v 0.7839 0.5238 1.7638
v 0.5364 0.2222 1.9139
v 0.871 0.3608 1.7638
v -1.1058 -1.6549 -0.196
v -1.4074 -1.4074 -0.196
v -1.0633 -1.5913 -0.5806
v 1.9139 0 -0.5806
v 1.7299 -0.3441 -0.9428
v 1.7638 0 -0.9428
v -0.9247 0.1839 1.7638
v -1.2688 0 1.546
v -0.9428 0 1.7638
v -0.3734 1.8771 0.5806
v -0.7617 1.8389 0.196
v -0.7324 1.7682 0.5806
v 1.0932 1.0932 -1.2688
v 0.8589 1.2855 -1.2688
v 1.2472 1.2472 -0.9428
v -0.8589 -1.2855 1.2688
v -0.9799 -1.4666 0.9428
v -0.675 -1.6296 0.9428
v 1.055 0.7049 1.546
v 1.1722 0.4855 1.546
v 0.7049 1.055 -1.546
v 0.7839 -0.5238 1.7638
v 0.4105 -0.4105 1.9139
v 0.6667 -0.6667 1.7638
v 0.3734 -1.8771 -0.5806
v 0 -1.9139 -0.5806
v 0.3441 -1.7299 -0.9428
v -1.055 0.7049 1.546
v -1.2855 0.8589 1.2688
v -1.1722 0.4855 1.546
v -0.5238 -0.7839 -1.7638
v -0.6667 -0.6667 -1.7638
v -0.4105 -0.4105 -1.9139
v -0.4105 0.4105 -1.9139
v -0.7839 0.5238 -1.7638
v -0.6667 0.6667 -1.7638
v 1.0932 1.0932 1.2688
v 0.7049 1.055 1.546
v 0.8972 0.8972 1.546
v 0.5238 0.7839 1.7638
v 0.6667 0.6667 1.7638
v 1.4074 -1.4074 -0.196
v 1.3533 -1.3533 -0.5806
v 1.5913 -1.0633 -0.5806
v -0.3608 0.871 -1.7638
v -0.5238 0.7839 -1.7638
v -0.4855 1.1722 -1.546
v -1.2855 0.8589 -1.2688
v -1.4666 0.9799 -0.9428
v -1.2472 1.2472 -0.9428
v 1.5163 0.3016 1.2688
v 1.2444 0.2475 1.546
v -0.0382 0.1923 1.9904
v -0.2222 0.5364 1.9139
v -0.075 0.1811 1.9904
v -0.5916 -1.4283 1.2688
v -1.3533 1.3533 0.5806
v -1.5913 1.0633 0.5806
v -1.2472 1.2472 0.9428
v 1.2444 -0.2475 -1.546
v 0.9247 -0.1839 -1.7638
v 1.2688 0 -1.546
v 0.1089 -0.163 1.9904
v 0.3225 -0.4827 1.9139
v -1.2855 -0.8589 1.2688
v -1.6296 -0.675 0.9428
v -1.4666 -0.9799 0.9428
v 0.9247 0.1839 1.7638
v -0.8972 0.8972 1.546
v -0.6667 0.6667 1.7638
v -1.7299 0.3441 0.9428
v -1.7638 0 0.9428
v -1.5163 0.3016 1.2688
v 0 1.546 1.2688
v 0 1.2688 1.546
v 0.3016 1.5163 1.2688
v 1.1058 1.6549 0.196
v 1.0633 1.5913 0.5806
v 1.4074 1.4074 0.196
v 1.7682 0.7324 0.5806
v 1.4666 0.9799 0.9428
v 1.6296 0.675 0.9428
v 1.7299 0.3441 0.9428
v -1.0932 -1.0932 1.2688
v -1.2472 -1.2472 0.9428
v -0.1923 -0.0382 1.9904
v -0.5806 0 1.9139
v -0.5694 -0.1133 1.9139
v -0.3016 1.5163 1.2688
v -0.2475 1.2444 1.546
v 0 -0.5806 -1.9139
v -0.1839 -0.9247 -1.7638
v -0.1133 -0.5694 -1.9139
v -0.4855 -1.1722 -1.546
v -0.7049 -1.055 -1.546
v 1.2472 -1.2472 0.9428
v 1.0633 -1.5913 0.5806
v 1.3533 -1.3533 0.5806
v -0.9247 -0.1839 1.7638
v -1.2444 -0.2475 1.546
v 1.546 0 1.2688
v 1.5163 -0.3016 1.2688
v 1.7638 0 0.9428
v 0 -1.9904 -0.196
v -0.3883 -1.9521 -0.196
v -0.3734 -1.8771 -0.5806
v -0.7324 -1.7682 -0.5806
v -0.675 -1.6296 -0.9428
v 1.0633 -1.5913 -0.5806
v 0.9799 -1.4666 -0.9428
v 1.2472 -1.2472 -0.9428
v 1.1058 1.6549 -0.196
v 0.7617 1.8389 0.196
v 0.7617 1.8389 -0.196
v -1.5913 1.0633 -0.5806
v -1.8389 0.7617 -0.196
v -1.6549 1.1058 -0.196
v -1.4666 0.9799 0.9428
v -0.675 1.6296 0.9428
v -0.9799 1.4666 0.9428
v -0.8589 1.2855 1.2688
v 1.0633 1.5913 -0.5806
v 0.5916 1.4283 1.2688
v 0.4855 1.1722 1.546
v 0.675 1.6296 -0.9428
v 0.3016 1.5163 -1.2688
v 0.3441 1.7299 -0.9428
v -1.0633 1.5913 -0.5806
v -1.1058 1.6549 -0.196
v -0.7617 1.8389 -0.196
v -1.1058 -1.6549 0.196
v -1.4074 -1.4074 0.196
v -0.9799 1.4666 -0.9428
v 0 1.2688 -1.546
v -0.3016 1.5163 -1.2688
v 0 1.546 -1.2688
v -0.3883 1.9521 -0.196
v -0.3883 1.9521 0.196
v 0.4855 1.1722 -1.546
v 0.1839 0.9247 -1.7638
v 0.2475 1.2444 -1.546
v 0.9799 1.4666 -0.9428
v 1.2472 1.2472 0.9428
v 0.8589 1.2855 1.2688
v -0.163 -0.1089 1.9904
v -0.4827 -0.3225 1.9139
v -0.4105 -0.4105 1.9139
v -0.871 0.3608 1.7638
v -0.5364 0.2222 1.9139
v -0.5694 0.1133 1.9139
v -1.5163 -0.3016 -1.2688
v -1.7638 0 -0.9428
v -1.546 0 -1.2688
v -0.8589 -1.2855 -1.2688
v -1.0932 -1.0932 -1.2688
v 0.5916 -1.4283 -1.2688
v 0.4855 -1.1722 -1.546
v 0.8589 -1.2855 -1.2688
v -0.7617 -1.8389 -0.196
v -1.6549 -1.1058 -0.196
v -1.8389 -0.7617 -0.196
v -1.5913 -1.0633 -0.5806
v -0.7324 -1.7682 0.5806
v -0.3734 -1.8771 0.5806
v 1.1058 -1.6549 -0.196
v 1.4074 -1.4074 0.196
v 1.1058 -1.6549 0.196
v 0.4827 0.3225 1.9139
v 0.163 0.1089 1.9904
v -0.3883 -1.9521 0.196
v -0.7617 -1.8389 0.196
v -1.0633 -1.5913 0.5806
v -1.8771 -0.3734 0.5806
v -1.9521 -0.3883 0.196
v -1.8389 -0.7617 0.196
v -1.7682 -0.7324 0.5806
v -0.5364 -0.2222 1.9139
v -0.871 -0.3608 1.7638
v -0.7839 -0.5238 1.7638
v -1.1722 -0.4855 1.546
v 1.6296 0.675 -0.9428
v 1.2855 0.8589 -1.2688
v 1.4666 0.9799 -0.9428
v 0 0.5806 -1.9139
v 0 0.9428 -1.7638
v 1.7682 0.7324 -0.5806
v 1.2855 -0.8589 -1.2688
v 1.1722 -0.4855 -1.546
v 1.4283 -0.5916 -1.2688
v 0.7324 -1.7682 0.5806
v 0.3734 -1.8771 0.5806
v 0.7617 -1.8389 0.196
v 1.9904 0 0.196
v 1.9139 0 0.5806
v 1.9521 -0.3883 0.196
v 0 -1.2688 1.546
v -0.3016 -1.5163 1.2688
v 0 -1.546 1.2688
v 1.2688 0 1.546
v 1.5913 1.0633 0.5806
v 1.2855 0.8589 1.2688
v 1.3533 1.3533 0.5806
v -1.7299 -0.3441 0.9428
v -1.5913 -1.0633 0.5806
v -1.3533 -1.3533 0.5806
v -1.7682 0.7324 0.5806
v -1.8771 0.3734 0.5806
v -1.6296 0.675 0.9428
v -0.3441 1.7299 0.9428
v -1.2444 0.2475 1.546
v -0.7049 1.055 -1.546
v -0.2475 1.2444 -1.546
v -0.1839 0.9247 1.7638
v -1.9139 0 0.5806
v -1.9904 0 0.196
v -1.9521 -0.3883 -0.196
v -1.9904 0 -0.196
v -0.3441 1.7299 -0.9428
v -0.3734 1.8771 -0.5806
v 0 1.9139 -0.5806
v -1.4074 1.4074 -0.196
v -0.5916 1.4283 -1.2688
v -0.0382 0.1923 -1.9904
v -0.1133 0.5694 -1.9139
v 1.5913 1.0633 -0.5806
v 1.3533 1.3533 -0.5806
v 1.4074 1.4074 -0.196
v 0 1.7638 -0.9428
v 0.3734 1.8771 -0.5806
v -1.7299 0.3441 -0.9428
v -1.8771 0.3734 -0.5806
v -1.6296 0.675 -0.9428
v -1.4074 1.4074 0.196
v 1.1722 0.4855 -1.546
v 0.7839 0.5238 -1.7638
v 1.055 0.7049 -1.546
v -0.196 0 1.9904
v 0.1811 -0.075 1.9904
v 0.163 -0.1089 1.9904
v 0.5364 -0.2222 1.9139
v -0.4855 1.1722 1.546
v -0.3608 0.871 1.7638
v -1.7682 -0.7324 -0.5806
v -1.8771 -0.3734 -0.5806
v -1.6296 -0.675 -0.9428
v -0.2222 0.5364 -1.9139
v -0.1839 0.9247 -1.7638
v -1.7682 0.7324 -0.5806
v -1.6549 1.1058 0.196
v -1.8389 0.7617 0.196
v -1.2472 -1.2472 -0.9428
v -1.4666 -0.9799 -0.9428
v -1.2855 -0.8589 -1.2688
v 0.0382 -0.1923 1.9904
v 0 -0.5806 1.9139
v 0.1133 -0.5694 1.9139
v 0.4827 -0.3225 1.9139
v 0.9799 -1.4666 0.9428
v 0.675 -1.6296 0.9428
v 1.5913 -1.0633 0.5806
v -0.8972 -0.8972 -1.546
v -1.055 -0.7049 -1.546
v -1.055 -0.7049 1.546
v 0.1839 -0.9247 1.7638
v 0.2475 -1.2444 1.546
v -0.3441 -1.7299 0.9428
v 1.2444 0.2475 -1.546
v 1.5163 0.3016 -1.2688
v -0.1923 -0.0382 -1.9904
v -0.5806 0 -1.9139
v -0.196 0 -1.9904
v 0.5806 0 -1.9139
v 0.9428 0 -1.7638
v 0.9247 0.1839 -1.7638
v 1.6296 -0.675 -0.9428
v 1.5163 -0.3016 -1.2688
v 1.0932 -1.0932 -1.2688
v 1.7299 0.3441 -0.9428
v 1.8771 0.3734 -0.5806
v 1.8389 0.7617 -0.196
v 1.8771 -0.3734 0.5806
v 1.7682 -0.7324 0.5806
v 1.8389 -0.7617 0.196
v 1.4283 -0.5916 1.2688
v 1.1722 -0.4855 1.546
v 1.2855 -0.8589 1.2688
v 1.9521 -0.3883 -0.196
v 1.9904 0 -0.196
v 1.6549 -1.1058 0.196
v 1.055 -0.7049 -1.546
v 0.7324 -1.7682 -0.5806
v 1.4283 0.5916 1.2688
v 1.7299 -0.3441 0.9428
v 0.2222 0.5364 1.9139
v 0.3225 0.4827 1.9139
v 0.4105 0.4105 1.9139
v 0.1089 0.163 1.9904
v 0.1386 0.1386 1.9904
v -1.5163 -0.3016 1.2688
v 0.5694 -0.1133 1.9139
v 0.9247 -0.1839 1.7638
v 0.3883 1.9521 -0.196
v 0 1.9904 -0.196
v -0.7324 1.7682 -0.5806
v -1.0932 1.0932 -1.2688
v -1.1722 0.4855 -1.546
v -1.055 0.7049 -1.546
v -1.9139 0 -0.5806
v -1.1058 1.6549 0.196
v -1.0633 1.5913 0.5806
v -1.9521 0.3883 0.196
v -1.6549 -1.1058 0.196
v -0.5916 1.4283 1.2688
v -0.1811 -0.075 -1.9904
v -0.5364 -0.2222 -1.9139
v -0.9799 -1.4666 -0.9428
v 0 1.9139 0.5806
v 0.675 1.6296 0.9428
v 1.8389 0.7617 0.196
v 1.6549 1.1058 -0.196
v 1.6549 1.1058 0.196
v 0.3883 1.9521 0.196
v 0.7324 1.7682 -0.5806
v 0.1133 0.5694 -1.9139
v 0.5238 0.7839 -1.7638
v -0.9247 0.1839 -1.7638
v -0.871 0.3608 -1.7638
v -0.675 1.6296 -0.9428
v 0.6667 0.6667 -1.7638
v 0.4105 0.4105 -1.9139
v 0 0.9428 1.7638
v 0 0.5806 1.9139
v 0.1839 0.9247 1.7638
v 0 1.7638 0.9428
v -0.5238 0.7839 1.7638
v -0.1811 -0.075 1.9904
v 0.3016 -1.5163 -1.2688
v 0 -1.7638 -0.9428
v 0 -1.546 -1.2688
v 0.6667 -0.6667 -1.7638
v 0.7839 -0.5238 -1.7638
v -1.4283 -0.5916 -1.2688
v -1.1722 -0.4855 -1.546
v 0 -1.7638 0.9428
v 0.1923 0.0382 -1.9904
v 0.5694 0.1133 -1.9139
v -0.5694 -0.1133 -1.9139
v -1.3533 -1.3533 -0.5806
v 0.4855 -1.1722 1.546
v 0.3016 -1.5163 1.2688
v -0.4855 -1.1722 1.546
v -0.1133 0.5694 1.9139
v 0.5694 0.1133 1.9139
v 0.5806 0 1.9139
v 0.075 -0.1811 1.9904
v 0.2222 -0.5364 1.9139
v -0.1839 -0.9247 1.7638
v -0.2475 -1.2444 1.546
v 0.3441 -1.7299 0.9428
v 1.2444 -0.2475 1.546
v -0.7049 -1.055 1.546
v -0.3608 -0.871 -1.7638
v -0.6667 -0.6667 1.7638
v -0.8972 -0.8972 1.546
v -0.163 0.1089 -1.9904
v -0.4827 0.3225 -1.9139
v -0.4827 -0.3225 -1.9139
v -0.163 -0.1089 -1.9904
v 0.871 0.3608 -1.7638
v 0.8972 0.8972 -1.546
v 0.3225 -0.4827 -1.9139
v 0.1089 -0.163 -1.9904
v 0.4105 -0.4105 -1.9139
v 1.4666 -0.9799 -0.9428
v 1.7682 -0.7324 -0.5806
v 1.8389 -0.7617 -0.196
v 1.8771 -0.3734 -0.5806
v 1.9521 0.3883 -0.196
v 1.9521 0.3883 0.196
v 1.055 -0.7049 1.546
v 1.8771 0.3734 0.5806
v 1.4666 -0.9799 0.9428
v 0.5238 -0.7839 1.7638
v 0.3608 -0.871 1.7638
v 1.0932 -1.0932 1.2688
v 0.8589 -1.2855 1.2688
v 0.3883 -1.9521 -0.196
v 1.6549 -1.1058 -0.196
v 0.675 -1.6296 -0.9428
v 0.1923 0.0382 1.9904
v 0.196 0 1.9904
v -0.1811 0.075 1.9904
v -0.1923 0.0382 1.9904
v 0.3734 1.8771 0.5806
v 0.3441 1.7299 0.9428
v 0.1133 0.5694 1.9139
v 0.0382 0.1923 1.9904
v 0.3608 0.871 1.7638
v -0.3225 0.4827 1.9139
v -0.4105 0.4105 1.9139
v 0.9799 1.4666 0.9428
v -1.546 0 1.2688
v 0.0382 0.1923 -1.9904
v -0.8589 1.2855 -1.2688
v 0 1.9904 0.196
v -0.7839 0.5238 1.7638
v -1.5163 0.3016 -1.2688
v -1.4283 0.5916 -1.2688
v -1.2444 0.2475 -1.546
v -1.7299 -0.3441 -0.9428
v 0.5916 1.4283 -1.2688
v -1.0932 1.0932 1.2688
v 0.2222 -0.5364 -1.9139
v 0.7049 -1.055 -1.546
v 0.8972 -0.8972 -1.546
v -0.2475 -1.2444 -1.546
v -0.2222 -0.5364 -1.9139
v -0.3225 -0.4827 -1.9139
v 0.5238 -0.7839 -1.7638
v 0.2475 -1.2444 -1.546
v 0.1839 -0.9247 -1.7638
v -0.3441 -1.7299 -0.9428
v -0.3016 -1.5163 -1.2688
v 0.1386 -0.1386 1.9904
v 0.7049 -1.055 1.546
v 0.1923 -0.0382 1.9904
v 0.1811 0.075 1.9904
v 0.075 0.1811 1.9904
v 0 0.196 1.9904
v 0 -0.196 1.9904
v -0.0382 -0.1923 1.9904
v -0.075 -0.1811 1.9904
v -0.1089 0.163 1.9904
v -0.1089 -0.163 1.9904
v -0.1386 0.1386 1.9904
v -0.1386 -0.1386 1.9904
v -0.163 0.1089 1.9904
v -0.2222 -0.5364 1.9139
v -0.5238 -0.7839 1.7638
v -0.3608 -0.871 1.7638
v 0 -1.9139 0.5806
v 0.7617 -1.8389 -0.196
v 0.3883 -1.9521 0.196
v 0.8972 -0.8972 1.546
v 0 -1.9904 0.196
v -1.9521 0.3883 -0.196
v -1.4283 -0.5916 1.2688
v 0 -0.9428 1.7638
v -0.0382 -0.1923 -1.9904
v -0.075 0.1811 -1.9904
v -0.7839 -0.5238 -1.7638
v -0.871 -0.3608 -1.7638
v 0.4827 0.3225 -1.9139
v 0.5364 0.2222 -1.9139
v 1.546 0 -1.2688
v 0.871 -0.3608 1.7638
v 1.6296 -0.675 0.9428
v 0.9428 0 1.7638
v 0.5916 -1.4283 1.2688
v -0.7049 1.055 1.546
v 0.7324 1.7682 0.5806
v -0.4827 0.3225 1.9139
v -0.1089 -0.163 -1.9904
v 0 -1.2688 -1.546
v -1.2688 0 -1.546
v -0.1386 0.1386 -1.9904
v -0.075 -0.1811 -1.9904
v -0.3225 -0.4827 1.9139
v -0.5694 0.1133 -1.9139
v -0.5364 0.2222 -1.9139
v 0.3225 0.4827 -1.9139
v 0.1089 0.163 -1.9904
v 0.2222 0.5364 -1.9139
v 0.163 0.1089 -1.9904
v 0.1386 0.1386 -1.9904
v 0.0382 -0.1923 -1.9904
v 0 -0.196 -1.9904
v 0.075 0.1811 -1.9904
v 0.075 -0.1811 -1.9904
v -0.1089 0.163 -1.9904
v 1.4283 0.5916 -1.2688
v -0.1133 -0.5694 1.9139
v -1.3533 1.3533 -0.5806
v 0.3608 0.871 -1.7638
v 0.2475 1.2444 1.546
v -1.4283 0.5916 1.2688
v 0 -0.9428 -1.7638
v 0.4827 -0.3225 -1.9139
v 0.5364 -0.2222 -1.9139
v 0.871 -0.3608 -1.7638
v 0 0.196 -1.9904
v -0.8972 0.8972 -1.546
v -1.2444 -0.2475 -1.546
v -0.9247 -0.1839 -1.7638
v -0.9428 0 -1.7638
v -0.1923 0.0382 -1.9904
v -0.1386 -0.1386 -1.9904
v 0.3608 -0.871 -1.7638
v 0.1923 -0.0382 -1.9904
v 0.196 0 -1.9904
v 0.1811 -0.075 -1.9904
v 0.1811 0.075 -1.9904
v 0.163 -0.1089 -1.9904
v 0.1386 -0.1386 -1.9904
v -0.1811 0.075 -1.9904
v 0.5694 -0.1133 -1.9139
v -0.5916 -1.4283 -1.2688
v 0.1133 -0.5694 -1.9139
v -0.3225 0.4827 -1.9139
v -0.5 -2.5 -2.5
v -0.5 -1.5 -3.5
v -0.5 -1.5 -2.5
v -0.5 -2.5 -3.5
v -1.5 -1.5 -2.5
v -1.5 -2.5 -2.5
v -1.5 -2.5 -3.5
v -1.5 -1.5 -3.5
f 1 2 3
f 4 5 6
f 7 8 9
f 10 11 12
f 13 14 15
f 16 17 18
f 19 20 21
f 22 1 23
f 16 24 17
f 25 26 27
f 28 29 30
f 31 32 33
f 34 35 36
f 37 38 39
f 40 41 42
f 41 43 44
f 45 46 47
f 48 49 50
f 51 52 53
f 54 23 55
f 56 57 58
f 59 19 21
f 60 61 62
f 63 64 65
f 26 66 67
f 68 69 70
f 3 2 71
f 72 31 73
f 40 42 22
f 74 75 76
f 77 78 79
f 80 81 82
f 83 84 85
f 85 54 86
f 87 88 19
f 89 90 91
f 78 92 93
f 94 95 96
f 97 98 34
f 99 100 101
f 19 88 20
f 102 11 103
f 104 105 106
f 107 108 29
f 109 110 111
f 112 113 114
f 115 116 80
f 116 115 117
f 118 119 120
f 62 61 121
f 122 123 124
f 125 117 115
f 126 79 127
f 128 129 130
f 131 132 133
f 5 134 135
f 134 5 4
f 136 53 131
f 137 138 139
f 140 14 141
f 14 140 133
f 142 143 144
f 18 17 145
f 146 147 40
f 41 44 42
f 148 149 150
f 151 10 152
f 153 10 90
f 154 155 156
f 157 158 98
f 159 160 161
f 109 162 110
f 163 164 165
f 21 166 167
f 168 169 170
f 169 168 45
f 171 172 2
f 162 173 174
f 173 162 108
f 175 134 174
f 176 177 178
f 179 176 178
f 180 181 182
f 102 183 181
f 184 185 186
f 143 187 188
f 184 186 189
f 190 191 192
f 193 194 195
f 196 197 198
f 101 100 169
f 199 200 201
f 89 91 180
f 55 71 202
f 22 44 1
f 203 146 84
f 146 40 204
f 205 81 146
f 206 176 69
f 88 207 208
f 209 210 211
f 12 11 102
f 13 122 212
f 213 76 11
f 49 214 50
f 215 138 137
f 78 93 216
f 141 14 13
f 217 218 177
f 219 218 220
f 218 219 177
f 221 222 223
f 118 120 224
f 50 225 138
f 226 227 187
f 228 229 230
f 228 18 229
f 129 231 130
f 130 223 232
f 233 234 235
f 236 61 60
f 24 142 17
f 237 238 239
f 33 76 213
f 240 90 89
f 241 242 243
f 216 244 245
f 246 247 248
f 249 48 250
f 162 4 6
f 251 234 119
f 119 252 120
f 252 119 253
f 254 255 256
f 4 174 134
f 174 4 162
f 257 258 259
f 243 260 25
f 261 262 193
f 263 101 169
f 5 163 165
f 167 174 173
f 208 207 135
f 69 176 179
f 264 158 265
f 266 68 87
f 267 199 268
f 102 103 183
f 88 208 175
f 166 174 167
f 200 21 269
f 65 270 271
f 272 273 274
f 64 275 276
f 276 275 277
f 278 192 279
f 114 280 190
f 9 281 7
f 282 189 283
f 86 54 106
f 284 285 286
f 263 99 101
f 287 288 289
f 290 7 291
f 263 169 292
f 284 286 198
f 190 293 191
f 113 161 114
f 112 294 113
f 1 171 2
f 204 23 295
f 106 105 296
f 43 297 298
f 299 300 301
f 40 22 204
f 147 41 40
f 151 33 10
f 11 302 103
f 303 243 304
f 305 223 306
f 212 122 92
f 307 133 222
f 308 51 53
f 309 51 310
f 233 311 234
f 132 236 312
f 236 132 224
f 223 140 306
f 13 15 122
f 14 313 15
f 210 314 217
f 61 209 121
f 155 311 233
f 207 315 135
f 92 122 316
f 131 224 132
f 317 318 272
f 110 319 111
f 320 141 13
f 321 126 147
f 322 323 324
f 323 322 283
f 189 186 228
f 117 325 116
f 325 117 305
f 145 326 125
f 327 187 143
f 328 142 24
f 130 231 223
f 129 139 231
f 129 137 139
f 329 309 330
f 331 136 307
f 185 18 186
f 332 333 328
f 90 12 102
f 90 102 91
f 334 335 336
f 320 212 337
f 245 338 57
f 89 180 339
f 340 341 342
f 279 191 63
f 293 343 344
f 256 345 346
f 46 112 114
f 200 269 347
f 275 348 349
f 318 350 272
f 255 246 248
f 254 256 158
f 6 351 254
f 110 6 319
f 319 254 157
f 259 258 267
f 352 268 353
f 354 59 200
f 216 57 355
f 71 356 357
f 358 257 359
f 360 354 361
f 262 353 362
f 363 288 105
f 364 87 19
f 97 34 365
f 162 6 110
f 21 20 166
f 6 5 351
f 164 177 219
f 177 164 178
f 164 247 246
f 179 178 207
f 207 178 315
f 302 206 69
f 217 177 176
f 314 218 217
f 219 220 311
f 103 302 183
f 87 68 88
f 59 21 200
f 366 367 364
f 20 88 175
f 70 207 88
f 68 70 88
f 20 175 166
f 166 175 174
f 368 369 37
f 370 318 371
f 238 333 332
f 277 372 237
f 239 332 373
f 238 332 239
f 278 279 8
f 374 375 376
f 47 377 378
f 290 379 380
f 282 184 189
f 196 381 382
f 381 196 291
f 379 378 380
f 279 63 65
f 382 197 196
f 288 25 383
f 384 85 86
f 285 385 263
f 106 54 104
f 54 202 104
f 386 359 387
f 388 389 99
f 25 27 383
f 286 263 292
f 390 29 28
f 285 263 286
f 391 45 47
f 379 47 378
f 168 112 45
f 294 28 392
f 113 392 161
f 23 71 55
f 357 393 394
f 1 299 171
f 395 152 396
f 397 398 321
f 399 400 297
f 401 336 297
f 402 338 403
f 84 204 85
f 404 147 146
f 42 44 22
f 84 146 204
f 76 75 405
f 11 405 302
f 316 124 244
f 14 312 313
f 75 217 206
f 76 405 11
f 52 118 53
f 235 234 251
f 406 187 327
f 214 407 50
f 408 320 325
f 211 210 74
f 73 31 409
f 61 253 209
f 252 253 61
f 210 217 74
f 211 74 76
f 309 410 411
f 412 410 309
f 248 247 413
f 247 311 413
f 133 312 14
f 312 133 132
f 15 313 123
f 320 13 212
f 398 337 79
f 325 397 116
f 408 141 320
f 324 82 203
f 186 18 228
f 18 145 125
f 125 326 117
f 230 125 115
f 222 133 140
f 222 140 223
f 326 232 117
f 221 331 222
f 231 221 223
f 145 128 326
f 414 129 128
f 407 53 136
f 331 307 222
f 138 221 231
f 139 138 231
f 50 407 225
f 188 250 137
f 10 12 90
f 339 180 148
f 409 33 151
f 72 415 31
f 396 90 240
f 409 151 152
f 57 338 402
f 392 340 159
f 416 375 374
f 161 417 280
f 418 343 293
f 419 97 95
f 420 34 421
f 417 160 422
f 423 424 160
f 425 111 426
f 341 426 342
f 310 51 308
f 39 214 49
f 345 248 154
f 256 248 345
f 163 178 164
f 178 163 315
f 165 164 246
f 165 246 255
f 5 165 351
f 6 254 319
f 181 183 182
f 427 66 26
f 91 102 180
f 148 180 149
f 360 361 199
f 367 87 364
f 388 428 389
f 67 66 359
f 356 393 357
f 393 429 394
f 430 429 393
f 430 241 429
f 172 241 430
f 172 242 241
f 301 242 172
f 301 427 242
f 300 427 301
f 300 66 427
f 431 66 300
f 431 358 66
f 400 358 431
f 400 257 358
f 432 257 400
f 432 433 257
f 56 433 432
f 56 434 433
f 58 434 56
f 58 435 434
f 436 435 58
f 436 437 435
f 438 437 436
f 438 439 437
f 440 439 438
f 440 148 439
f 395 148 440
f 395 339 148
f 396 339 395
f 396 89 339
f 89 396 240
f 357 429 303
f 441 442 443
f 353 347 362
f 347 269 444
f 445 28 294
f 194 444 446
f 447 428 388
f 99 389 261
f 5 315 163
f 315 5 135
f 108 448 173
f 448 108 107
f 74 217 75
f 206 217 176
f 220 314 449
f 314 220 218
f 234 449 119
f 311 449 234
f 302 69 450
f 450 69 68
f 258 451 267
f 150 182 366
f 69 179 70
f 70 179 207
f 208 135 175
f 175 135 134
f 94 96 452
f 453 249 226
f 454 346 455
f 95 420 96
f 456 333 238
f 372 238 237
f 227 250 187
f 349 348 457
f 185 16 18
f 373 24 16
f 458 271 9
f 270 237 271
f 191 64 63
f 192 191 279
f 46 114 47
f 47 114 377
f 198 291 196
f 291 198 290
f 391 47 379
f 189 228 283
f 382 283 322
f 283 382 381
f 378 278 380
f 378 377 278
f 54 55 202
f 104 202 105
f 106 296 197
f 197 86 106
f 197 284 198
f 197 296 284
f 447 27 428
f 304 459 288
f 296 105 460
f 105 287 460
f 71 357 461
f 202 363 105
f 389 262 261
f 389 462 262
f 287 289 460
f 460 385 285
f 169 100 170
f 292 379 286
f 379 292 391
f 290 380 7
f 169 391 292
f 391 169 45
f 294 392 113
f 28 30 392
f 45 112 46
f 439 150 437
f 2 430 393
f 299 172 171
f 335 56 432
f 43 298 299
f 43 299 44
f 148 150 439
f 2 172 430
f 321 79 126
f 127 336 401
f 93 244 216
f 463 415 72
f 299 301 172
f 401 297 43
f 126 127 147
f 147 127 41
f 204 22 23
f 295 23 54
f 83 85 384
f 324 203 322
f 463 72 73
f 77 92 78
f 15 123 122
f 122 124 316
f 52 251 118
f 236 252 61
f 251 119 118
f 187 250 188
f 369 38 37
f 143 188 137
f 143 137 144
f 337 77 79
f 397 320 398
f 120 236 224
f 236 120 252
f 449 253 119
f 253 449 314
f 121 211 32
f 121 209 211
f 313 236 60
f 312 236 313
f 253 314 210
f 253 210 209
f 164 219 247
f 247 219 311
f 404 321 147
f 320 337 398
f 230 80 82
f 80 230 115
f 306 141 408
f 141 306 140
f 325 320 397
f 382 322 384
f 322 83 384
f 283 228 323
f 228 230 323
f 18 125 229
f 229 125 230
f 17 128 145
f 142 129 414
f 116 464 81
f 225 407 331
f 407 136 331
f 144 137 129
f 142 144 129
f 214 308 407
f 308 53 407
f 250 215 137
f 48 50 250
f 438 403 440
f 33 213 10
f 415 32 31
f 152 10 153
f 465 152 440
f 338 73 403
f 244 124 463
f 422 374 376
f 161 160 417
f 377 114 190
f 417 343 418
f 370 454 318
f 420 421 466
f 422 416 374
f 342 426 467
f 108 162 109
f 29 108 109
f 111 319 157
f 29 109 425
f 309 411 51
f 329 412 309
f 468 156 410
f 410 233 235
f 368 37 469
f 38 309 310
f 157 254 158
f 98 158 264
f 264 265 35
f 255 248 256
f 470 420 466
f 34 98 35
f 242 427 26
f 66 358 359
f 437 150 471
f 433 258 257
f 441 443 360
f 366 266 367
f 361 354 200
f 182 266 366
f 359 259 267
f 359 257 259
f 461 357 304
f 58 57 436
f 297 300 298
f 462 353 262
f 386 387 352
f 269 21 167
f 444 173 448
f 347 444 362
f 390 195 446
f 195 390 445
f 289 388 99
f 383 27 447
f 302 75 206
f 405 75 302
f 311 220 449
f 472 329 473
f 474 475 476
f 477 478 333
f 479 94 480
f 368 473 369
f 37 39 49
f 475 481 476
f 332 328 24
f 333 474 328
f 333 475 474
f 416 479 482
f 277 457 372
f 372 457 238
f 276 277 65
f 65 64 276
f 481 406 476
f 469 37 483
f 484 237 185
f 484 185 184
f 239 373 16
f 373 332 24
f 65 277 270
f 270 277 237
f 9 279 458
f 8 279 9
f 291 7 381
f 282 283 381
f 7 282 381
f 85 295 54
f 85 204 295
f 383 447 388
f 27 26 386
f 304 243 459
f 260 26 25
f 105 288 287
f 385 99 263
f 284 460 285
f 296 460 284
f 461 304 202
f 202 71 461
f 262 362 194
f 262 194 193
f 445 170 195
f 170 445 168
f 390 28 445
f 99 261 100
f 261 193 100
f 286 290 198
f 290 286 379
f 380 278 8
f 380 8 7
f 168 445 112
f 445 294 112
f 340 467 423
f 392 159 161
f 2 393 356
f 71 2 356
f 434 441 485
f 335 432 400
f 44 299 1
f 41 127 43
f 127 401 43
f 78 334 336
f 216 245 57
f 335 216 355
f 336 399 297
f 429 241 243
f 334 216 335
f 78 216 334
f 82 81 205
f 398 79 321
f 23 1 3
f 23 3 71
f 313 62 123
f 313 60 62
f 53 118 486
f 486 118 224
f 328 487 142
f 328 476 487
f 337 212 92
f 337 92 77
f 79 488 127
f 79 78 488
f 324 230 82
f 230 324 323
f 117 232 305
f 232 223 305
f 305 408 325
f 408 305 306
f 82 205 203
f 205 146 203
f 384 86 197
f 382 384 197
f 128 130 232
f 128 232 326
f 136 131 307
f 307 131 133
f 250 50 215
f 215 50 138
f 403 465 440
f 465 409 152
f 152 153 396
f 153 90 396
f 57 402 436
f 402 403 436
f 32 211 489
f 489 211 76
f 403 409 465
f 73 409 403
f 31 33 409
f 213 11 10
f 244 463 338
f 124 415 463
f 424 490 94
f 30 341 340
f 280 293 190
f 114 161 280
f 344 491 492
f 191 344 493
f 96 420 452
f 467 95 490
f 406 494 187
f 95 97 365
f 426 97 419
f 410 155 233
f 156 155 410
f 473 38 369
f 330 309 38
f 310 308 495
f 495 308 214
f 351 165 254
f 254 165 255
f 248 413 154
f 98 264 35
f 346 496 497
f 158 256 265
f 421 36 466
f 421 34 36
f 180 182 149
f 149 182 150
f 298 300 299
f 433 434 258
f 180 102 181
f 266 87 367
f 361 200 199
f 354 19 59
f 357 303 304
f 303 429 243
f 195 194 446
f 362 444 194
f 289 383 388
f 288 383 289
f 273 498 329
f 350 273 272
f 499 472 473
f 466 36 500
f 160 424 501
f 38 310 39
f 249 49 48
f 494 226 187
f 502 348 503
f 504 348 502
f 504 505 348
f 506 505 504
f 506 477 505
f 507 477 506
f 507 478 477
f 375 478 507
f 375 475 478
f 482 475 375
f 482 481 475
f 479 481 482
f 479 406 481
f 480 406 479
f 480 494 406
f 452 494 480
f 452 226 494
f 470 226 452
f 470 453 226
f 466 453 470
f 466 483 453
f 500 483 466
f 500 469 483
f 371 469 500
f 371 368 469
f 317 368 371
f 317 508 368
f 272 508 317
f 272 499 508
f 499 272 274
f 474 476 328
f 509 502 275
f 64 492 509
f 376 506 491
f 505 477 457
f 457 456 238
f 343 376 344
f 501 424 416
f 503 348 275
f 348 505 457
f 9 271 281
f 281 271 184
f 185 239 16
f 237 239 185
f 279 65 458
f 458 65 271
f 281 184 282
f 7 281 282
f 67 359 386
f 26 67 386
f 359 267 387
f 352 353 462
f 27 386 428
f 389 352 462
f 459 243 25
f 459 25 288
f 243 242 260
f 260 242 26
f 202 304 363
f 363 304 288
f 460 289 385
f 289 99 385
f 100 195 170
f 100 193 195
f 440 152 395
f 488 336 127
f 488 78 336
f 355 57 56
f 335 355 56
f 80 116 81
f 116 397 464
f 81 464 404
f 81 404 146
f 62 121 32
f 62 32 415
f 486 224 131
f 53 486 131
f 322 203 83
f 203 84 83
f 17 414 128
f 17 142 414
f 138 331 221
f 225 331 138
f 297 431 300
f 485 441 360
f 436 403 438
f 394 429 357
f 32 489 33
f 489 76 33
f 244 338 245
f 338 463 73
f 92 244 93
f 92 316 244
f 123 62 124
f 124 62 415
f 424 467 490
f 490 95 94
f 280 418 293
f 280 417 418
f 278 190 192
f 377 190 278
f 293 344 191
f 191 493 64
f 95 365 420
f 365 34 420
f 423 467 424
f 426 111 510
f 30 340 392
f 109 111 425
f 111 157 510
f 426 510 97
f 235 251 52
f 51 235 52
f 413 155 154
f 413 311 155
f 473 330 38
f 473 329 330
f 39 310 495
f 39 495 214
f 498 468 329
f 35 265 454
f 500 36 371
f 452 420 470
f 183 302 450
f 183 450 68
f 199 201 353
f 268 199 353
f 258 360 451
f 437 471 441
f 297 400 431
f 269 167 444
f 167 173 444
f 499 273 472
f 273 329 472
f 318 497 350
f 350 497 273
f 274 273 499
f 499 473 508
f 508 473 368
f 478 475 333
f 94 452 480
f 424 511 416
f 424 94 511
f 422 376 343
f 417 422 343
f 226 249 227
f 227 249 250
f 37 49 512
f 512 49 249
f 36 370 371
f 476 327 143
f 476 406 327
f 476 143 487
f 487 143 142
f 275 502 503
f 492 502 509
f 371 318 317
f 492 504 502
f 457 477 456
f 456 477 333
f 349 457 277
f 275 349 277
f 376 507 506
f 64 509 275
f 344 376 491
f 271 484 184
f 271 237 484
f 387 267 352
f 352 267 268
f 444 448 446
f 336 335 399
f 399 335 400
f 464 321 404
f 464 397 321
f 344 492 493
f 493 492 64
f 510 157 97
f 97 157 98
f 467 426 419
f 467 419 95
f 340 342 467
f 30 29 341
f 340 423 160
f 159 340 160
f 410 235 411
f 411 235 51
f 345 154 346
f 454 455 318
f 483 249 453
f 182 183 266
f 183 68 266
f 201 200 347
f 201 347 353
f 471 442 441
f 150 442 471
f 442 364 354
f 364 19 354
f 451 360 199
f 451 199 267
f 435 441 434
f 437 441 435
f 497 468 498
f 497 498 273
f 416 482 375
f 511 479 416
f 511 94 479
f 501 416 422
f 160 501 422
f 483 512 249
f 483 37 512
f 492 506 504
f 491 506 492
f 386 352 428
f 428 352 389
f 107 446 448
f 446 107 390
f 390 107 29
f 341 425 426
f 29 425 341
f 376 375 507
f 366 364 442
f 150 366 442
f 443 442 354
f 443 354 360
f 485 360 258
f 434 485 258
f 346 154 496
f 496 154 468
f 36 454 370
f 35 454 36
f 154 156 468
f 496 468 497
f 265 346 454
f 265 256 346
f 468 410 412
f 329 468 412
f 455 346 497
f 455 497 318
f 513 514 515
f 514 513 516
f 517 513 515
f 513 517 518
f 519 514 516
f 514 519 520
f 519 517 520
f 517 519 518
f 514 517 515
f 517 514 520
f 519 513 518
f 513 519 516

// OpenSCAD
// file: ../scon.scad
function scon_value(scon,path,missing = function(path) undef,dist = 0) =
  is_undef(path) ? missing :
  (len(path) <= dist || is_undef(scon)) ?
    (is_undef(scon) ? missing(path) : scon) :
    let (
      key = path[dist],
      next = is_undef(key) ?
        scon :
	is_string(key) ?
          _scon_map(scon, key, path) :
          _scon_index(scon, key, path)
    ) scon_value(next, path, missing, dist + 1);

// Make a property-extractor function from an SCON value.
// Basic usage:
//
//   cfg_scon = [["x",1],["y",true]];
//   cfg = scon_make([["x",1],["y",true]]);
//   x=cfg(["x"]);
//   y=cfg(["y"]);
//   z=cfg(["z"], 3); // z = 3 because it is not in cfg_scon.
//
// Advanced Meta-programming note:
//   - cfg([])   ⇒ returns the full SCON data structure.
//   - cfg(undef)⇒ returns the configured missing-fallback function.
// This allows for introspection of the data used to make cfg function.
//
function scon_make(scon,base=undef)=
  is_undef(base) ?
    function(path,missing=undef)
      scon_value(scon,path,function (missing_path) missing)
  :
    function(path,missing=undef)
      scon_value(scon,path,function (missing_path) base(missing_path,missing));

//
// Convert a scon value to a json string
//
// Ex: scon_to_json(true) == "true"
//     scon_to_json(17) == "17"
//     scon_to_json("length") == "\"length\""
//     scon_to_json([["x",1],["y",2]]) == "{\"x\":1,\"y\":2}"
//     scon_to_json([2,3,5,8]) == "[2,3,5,8]"
//
//  List/object ambiguity! Since OpenSCAD has no native map, there must be an
//  ambiguity in the conversion to the distinct [item[0],item[1],...] list
//  and the {"name0":value0,"name1":value1,..} object notation in JSON.
//
//  The rule Scon uses is:
//
//    If every element of a Vector is a [string,value] pair, then it is converted
//    to an object.  Otherwise it is a list.
//
//    So [], [["x",1],["y",2]], are maps and become "{}" and "{\"x\":1,\"y\":2}"
//    any other Vector is converted to a list.
//
function scon_to_json(scon) =
  is_undef(scon) ? "null" :
  is_bool(scon) ? str(scon) :
  is_num(scon) ? str(scon) :
  is_string(scon) ? _scon_json_str(scon) :
  _scon_is_map(scon) ? _scon_json_map(scon) :
  is_list(scon) ? _scon_json_list(scon) :
  _scon_json_str("??? ",scon," ???");

//
// Development builds of OpenSCAD with the import-function feature enabled
// can import Json directly.  To convert this import to SCON, you can use this
// function.
//
// The json2scon.js and json2scon.py scripts create a back-portable way to
// do this by externally converting to 
// 
// Developer Build usage:
//
//   cfg = scon_make(json_to_scon(import("config.json")));
//
// Portable usage:
//
//   # from terminal or build script
//   python3 json2scon.py <config.json >config.scon
//   # or
//   node json2scon.js <config.json >config.scon
//   # or (quickjs)
//   qjs --std -m json2scon.js <config.json >config.scon
//
//   # in OpenSCAD
//   cfg = scon_make(include "config.scon");
//
function scon_from_json(json) =
  is_object(json)
    ? [ for (k = json) [ k, scon_from_json(json[k]) ] ]
  : is_list(json)
    ? [ for (i = [0:len(json)-1]) scon_from_json(json[i]) ]
  : json;

function _scon_map(scon_map, key, path) =
    let (result = search([key], scon_map,0)[0])
      len(result) > 0 ? scon_map[result[len(result)-1]][1] : undef;

function _scon_index(scon_list, index, path) =
    (is_list(scon_list) && 0 <= index && index < len(scon_list)) ? scon_list[index] : undef;

function _scon_is_mapping(scon) =
    is_list(scon) && len(scon) == 2 && is_string(scon[0]);

function _scon_all_seq(seq,begin,end) =
  begin >= end ? true : seq(begin) && _scon_all_seq(seq,begin+1,end);

function _scon_is_map(scon) =
    is_list(scon) &&
    _scon_all_seq(function(i) _scon_is_mapping(scon[i]),0,len(scon));


function _scon_str_seq(seq,begin,end) = // str(seq(begin),...,seq(end-1))
  let (n = (begin < end) ? end - begin : 0,
       m = ((n % 2) == 0) ? n/2 : (n-1) / 2)
  n > 1 ? str(_scon_str_seq(seq,begin,begin+m),_scon_str_seq(seq,begin+m,end)) :
  n == 1 ? str(seq(begin)) : "";

function _scon_str_list(list,begin=0,_end=undef) =
  let (seq = function (i) list[i],end = is_undef(_end) ? len(list) : _end)
  _scon_str_seq(seq,begin,end);

// sep can also be a lambda function of the index
function _scon_str_join_seq(seq,begin,end,sep=",") =
  let (n = (begin < end) ? end - begin : 0,
       m = ((n % 2) == 0) ? n/2 : (n-1) / 2)
  n > 1 ? str(_scon_str_join_seq(seq,begin,begin+m,sep),is_function(sep) ? sep(begin+m-1) : sep,_scon_str_join_seq(seq,begin+m,end,sep)) :
  n == 1 ? str(seq(begin)) : "";

function _scon_str_join_list(list,begin=0,_end=undef,sep=",") =
  let (seq = function (i) list[i],end = is_undef(_end) ? len(list) : _end)
  _scon_str_join_seq(seq,begin,end,sep);
  
function _scon_json_chr(c) =
  (c == "\"") ? "\\\"" :
  (c == "\\") ? "\\\\" :
  (c == "/") ? "\\/" :
  (c == "\x08") ? "\\b" :
  (c == "\x0c") ? "\\f" :
  (c == "\n") ? "\\n" :
  (c == "\r") ? "\\r" :
  (c == "\x09") ? "\\t" :
  c;  

function _scon_json_str(scon) =
  let (seq=function (i) _scon_json_chr(scon[i]))
  str("\"",_scon_str_seq(seq,0,len(scon)),"\"");

function _scon_json_map(scon) =
  let(seq=function(i) str(_scon_json_str(scon[i][0]),":",scon_to_json(scon[i][1])))
  str("{",_scon_str_join_seq(seq,0,len(scon)),"}");

function _scon_json_list(scon) =
  let(seq=function(i) scon_to_json(scon[i]))
  str("[",_scon_str_join_seq(seq,0,len(scon)),"]");
// main file
include <../scon.scad>

// base configuration values for shapes
shape = scon_make([
  ["center",[0,0,0]],
  ["color",[1,1,0]],
  ["fn", 32]
]);

sphere1 = scon_make([
  ["radius",1]
], shape);

sphere2 = scon_make([
  ["radius",2],
  ["color",[1,0,0,0.25]],
], shape);

cube1 = scon_make([
  ["size",[1,1,1]],
  ["center",[-1,-2,-3]],
  ["color",[0,0,1]]
], shape);

// common steps for shapes
module shape_draw(me) {
  let (me_center=me(["center"]), me_color=me(["color"])) {
    color(me_color) translate(me_center) children();
  }
}

module sphere_draw(me) {
  let(me_radius = me(["radius"]), me_fn = me(["fn"]))
  {
    shape_draw(me) { sphere(r=me_radius,$fn=me_fn); }
  }
}

module cube_draw(me) {
  let(me_size = me(["size"]), me_fn = me(["fn"])) {
    shape_draw(me) { cube(size=me_size, center = true); }
  }
}

sphere_draw(sphere1);
sphere_draw(sphere2);
cube_draw(cube1);
